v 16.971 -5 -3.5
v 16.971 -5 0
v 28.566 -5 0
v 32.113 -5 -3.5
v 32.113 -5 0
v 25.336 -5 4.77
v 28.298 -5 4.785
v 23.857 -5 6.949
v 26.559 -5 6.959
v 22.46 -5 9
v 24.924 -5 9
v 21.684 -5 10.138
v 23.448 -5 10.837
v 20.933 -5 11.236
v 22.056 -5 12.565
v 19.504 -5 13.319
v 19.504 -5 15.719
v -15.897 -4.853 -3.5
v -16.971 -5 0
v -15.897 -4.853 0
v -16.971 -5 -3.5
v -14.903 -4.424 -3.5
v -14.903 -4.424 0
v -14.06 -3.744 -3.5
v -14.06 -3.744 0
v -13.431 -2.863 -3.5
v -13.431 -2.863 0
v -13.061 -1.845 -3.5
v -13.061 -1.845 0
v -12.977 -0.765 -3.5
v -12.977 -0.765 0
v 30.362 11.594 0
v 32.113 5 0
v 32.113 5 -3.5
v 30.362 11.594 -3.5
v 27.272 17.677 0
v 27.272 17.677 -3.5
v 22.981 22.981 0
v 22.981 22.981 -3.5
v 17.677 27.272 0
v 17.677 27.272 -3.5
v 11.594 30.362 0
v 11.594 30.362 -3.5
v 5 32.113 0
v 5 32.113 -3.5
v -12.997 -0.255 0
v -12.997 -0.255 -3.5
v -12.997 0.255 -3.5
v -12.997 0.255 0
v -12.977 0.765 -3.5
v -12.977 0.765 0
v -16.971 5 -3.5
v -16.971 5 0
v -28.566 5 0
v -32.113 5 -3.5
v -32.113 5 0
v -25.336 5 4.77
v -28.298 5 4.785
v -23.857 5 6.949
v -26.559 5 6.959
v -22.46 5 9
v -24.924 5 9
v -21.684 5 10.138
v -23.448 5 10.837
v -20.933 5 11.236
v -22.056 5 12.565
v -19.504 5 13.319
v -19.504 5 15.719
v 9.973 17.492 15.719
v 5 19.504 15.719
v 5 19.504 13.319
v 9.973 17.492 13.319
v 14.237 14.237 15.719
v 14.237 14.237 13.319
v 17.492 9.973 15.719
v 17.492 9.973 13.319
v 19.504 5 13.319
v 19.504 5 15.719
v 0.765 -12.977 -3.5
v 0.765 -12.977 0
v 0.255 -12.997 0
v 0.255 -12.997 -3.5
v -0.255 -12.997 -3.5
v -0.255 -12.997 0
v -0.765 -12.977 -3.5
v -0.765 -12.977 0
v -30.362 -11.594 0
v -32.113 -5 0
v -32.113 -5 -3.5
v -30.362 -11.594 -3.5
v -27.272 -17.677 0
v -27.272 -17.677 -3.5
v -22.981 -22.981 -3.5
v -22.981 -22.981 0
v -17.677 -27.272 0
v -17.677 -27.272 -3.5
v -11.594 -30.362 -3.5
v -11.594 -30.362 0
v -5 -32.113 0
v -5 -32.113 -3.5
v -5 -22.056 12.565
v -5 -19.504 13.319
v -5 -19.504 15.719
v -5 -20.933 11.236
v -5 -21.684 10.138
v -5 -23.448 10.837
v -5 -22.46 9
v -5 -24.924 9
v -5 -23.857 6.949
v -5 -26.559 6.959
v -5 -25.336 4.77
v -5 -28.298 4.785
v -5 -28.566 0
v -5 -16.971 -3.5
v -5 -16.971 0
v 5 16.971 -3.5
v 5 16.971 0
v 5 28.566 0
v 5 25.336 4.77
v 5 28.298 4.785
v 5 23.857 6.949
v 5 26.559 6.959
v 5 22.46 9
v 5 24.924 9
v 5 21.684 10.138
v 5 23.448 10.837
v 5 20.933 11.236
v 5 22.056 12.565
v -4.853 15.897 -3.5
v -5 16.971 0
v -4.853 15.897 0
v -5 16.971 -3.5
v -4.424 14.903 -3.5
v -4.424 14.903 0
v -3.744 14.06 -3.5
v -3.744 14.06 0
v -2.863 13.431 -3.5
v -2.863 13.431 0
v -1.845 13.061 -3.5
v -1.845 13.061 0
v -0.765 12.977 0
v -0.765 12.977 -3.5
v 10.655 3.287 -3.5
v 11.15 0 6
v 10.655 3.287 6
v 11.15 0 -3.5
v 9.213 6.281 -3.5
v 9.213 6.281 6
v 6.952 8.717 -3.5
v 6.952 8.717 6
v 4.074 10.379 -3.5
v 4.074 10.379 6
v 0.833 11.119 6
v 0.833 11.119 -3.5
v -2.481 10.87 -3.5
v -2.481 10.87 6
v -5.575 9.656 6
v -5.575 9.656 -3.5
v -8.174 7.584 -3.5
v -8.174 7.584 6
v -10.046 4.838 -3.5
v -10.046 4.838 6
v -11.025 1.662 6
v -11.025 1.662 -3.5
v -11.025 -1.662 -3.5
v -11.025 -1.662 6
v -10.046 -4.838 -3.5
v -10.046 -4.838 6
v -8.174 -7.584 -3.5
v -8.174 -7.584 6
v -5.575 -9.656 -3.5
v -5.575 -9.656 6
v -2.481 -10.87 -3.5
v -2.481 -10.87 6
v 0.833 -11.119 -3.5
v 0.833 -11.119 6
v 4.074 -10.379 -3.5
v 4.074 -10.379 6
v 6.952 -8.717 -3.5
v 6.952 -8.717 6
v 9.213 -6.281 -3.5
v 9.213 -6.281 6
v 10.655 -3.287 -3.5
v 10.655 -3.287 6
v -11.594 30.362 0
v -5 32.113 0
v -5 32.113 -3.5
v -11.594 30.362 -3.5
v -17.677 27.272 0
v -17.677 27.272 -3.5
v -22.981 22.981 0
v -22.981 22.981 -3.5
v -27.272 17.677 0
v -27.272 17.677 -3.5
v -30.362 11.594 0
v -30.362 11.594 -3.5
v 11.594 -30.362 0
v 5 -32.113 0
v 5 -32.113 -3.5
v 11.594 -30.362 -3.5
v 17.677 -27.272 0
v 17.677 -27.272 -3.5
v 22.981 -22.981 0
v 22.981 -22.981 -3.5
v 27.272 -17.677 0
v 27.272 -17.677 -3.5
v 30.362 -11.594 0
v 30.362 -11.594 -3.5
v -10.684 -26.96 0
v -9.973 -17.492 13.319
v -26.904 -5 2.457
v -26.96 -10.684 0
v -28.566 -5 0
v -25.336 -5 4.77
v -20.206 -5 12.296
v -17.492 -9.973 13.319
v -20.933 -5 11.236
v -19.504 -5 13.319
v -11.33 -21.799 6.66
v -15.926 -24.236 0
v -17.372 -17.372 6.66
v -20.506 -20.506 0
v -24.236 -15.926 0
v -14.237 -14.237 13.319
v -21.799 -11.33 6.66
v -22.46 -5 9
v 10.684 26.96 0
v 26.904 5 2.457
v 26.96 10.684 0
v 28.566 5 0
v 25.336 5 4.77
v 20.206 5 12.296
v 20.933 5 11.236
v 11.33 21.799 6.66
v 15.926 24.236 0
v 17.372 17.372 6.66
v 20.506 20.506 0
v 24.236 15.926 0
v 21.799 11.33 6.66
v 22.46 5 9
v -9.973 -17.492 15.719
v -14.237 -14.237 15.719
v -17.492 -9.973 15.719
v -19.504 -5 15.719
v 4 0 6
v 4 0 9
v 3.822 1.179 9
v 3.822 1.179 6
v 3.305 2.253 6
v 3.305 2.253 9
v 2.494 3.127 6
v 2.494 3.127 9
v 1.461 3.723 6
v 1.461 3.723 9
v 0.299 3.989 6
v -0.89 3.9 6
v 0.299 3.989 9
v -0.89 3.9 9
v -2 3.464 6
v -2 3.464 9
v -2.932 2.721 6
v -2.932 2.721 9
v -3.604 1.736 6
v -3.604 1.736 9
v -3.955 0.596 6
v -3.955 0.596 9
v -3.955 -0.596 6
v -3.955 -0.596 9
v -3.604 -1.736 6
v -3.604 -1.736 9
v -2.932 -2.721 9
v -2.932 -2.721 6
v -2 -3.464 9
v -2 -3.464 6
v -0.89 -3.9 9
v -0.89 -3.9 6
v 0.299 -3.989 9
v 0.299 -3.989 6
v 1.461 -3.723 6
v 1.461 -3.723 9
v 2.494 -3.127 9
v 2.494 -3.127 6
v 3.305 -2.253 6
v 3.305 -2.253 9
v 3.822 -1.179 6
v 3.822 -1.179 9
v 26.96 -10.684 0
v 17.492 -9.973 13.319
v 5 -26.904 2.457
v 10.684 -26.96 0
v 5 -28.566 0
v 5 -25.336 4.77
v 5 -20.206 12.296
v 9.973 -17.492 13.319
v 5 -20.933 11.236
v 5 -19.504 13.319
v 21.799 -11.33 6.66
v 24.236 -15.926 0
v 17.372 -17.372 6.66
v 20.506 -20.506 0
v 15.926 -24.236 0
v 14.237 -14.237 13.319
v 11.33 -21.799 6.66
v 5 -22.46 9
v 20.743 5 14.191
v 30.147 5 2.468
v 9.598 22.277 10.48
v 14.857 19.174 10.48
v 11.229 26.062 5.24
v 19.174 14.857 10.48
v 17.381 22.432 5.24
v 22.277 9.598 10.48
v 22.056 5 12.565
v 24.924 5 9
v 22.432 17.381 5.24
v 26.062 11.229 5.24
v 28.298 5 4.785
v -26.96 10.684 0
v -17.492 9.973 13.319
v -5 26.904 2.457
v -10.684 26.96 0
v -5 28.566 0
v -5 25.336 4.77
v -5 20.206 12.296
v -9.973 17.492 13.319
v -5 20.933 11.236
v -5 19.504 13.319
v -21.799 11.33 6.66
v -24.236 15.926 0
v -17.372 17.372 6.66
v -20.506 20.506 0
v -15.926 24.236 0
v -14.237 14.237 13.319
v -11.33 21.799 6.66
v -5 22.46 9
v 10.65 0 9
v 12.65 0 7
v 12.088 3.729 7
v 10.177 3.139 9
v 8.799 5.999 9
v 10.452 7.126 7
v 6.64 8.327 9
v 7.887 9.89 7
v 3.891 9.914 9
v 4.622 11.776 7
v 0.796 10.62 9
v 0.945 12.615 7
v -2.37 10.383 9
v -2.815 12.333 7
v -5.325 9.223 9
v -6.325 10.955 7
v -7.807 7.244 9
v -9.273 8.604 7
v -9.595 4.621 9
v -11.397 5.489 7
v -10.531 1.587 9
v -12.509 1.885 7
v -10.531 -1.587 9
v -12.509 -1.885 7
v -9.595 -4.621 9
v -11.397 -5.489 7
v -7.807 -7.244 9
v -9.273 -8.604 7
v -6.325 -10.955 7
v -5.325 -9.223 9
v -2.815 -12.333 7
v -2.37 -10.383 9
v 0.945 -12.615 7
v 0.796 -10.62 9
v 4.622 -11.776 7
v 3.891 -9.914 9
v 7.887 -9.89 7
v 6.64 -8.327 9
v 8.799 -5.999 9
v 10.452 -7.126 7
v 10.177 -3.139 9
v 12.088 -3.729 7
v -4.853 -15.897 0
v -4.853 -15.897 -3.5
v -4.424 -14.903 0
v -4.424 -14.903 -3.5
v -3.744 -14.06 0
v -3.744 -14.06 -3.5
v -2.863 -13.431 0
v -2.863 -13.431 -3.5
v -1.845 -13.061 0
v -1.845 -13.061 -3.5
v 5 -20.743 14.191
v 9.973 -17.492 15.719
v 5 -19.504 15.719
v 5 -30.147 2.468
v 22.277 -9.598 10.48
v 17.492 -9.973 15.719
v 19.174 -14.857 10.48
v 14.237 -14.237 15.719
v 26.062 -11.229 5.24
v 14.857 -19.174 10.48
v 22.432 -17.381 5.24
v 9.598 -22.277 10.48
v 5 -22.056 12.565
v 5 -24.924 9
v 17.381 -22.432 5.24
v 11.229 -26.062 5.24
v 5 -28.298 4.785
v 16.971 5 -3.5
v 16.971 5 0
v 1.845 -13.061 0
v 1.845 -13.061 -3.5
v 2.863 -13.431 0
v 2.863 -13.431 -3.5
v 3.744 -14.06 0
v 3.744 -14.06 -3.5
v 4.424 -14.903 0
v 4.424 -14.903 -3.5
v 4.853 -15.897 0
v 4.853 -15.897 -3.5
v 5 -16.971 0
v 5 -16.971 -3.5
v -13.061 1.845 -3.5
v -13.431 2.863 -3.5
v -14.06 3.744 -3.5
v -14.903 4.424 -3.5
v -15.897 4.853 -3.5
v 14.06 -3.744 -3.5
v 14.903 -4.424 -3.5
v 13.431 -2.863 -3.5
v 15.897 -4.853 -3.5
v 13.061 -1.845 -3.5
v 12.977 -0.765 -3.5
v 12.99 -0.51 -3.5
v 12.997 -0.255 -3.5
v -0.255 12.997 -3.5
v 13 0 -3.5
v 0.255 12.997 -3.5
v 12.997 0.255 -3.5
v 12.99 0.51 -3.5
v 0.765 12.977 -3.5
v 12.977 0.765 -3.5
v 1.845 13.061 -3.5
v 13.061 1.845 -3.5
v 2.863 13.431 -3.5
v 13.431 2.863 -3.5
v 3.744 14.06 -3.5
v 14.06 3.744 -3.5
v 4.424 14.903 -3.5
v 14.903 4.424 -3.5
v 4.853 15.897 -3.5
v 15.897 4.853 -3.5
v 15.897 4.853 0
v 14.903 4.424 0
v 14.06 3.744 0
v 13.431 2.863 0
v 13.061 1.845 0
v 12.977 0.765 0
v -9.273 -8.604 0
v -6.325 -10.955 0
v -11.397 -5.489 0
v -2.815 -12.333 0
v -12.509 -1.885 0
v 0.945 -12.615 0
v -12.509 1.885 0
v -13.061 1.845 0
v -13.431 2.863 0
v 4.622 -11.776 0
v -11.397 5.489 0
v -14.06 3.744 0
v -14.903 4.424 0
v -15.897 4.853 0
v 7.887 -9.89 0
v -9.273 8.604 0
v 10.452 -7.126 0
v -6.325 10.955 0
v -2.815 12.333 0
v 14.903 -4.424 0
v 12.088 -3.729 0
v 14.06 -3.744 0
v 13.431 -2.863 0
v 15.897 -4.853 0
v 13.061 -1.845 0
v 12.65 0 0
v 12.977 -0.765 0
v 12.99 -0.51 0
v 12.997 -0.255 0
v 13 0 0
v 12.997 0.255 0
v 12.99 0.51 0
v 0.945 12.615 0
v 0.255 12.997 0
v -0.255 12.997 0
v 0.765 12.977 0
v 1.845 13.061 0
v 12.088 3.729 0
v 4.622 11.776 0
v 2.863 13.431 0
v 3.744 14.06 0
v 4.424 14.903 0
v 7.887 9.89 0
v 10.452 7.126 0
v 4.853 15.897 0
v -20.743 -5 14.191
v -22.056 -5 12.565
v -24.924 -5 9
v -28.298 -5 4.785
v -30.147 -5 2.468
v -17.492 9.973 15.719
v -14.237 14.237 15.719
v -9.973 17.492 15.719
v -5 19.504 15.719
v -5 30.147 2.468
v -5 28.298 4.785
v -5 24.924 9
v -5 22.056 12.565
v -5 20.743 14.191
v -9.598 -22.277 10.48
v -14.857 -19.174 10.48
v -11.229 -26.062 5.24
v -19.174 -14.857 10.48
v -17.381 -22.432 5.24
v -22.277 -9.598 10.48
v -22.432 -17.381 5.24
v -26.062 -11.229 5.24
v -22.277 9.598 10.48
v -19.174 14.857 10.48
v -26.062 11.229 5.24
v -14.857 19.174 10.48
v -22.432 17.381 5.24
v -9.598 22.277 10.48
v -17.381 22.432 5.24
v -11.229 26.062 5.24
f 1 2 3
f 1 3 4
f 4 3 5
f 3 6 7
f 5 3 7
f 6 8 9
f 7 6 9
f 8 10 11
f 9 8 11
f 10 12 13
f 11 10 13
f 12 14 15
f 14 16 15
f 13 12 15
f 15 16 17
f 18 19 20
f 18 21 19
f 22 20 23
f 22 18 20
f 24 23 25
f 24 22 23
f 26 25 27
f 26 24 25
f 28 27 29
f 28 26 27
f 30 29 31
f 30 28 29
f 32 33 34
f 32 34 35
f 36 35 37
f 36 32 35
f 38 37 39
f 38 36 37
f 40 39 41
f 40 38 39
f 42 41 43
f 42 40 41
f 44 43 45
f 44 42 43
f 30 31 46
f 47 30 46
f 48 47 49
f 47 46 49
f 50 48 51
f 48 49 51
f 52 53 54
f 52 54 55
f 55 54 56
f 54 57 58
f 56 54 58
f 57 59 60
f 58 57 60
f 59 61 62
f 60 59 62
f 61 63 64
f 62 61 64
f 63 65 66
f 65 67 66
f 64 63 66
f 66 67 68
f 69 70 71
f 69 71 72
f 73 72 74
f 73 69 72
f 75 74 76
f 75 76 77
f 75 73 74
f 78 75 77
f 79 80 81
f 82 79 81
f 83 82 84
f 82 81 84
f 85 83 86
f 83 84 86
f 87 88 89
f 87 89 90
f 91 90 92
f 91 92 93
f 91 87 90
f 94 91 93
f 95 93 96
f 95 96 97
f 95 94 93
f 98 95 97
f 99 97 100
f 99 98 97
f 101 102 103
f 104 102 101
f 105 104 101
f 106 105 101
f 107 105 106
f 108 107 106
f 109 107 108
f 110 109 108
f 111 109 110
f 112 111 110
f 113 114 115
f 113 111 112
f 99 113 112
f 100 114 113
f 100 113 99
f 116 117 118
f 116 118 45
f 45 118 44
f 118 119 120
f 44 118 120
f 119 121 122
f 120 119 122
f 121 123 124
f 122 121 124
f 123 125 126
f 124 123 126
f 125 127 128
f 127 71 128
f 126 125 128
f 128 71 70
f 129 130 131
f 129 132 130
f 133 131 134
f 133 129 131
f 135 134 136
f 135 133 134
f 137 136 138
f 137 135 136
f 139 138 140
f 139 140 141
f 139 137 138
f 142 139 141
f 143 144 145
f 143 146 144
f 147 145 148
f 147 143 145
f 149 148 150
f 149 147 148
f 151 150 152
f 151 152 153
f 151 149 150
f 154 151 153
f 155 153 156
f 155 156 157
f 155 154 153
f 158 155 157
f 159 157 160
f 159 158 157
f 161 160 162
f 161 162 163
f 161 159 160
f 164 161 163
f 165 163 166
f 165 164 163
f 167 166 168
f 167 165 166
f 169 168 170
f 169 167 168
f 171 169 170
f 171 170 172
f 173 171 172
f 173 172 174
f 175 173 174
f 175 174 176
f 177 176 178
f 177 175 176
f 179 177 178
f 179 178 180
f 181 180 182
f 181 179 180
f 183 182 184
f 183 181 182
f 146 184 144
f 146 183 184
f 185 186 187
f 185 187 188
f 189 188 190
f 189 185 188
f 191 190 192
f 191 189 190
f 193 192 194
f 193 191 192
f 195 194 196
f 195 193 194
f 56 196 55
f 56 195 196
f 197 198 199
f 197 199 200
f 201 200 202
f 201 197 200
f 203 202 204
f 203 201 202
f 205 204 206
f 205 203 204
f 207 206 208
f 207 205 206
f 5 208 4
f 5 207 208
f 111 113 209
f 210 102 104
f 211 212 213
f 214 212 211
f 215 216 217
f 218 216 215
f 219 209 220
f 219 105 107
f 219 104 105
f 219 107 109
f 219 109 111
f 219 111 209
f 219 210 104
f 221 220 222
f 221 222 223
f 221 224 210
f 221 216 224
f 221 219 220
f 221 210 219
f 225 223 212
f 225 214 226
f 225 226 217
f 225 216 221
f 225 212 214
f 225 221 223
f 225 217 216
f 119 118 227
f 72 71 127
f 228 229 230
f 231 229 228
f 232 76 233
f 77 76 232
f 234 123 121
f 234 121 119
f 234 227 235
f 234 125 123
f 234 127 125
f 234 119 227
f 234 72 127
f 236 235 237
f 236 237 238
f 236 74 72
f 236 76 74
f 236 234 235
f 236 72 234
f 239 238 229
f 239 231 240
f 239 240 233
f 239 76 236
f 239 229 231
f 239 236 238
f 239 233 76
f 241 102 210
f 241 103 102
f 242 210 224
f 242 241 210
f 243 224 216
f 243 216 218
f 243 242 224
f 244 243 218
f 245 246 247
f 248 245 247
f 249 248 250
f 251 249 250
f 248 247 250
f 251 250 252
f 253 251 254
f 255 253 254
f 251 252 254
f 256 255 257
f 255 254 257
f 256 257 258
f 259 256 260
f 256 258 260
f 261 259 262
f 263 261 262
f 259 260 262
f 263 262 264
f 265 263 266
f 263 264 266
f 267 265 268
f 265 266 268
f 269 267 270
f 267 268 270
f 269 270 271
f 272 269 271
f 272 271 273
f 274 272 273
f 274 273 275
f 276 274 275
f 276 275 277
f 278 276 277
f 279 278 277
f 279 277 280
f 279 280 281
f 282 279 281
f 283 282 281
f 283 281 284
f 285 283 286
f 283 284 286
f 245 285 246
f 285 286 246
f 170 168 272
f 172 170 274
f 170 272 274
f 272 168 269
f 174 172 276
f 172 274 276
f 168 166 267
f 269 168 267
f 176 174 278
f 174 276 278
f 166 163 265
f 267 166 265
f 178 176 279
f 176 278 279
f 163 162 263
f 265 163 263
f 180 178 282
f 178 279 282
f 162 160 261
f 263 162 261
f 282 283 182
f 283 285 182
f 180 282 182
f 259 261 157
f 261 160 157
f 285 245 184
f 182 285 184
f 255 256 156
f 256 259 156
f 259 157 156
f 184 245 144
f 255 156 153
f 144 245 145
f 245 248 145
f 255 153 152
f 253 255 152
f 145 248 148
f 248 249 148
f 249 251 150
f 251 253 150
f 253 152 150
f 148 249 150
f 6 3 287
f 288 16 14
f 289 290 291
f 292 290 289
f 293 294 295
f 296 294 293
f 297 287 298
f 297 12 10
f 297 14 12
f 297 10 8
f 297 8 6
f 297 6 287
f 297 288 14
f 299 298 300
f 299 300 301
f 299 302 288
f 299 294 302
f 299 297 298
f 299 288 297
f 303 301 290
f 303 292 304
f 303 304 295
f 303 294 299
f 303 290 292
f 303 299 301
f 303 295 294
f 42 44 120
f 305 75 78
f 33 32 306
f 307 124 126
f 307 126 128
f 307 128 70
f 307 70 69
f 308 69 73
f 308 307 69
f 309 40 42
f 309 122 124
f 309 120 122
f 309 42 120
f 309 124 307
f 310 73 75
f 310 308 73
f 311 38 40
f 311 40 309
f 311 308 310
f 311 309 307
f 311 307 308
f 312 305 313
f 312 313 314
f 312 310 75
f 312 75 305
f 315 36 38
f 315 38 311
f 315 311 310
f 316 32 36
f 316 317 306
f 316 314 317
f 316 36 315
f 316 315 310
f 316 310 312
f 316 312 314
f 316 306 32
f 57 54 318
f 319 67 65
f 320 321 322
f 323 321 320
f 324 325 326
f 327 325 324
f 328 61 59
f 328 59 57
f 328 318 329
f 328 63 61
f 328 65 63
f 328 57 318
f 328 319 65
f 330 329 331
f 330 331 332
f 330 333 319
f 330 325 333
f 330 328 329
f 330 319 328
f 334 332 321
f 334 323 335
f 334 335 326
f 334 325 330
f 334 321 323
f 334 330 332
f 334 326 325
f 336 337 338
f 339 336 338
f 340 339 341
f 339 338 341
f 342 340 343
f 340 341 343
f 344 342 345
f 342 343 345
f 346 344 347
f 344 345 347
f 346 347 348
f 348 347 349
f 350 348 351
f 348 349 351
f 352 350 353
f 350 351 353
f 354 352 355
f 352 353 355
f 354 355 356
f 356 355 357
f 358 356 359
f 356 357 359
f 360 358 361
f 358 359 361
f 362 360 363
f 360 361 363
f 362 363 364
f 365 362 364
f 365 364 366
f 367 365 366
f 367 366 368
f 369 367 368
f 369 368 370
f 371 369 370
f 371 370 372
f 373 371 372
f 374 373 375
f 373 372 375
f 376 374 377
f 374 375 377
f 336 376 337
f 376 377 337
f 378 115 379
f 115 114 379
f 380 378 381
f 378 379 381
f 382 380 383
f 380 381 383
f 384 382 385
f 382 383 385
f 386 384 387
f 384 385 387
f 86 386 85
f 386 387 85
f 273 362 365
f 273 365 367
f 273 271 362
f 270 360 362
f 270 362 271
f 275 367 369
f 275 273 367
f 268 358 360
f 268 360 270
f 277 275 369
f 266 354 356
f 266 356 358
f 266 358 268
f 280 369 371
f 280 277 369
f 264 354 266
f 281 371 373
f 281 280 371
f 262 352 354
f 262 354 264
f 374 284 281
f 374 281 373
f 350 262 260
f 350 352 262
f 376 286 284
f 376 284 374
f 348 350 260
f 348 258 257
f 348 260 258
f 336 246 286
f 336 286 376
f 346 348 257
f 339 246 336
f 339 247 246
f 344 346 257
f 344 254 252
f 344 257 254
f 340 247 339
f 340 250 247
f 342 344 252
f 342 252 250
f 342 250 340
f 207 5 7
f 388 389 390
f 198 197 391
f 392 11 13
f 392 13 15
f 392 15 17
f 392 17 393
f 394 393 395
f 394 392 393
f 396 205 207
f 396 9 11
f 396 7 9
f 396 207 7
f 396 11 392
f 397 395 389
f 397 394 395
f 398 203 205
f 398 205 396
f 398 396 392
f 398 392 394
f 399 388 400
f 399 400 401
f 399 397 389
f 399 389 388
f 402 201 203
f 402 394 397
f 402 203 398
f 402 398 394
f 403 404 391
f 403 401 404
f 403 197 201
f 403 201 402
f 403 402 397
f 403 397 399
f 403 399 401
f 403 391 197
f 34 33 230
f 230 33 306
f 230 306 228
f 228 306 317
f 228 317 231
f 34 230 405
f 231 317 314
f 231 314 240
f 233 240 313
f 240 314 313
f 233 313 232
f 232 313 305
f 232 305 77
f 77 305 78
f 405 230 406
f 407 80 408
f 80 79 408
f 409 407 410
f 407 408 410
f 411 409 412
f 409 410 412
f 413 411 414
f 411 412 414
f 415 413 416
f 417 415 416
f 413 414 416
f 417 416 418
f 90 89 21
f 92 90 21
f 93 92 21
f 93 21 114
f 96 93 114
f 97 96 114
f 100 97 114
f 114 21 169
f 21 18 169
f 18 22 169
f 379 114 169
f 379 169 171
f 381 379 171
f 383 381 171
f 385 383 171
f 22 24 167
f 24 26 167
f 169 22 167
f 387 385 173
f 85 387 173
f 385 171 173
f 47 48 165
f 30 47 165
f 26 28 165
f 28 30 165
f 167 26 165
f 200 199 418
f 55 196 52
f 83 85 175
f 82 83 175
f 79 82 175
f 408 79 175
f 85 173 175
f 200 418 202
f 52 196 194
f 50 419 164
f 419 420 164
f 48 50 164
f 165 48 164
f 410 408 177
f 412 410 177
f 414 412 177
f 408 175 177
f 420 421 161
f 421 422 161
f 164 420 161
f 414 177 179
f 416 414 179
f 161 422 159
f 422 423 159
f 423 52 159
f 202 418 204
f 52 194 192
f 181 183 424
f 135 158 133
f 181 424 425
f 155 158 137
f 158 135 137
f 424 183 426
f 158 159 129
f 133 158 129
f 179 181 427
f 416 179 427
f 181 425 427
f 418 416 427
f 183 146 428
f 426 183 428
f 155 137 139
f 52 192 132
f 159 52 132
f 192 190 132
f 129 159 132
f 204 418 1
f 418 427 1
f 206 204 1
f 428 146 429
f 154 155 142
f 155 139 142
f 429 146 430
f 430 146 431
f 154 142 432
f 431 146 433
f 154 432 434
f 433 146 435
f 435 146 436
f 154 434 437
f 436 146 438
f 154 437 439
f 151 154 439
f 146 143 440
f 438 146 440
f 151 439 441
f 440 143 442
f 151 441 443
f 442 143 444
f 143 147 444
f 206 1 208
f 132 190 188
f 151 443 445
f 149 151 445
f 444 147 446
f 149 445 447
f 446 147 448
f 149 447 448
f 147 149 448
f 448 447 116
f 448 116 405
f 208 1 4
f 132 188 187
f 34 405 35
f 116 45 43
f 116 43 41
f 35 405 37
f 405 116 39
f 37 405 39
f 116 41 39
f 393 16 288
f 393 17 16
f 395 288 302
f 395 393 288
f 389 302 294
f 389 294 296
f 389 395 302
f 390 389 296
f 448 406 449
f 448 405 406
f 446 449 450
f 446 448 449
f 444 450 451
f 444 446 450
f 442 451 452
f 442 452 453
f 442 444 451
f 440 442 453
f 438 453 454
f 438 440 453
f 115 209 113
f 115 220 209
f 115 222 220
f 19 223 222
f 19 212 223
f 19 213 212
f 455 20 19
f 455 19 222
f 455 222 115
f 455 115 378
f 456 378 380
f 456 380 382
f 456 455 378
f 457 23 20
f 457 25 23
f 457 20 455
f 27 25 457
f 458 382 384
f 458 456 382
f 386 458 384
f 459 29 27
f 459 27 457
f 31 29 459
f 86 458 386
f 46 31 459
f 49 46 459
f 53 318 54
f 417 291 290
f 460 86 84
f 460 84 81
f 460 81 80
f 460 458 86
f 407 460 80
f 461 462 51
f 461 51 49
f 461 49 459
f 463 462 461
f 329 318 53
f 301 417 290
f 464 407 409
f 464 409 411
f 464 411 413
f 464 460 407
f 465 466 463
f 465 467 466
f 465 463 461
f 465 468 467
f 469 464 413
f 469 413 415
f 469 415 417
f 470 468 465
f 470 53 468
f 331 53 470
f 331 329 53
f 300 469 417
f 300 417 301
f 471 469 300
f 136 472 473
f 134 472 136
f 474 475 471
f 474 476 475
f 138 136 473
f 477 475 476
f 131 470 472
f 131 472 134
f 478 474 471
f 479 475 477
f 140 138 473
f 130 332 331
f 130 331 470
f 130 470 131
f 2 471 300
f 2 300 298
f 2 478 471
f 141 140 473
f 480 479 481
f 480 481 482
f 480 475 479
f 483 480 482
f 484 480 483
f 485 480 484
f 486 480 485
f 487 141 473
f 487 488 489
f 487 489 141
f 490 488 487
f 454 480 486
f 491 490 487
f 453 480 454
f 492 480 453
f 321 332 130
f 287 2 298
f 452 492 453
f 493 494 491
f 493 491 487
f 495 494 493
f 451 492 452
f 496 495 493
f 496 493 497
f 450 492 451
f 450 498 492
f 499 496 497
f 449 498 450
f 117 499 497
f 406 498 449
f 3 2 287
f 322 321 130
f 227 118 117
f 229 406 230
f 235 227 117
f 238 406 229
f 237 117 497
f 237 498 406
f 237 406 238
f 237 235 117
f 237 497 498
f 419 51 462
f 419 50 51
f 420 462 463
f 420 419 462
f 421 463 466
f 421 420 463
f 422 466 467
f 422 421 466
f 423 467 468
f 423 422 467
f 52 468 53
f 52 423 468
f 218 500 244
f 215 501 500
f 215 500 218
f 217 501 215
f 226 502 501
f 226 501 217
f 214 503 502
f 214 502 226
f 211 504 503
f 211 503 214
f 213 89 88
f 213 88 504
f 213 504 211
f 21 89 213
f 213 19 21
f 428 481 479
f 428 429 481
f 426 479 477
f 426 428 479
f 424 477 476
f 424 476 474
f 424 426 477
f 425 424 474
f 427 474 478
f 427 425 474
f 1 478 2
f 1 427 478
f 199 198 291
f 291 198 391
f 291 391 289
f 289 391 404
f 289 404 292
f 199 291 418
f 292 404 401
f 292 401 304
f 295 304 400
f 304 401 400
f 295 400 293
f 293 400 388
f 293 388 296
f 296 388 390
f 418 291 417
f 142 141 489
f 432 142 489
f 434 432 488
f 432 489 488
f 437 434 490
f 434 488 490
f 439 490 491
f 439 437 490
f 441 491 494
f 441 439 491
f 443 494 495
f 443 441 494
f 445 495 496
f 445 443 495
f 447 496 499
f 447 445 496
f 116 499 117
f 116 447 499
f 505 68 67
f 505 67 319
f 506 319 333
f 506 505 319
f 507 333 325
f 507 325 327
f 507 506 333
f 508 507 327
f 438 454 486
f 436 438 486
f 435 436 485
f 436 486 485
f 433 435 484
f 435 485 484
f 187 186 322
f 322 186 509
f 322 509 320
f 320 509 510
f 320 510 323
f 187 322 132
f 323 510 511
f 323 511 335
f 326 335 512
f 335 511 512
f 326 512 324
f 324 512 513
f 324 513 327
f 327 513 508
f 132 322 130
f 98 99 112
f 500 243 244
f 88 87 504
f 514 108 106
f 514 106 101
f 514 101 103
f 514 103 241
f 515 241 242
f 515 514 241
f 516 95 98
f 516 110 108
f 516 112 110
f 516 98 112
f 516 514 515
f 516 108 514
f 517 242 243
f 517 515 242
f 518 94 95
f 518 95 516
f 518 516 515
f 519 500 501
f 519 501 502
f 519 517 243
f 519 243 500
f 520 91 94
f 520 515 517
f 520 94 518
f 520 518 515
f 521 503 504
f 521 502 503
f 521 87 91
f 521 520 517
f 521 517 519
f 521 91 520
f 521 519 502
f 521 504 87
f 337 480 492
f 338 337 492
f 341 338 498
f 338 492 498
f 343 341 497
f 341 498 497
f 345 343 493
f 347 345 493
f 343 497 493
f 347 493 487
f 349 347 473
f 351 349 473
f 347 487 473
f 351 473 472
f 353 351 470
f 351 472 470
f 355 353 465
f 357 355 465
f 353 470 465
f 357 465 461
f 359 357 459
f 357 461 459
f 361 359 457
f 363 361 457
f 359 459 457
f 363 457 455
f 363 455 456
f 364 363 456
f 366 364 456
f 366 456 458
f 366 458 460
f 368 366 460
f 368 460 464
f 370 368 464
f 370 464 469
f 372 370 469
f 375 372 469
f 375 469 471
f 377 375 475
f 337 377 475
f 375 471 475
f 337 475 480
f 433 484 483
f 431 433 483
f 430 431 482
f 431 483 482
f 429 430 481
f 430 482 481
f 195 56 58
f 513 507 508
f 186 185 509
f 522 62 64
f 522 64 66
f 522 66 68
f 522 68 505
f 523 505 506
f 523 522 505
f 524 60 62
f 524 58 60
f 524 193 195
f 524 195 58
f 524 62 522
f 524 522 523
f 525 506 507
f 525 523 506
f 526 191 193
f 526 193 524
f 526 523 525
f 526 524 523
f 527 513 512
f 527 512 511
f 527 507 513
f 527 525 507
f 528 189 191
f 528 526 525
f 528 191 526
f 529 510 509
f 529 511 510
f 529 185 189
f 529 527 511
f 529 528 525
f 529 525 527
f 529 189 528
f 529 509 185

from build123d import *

# Parameters (mm, degrees)
F0_R      = 32.5
F0_R_2    = 12.65
F0_R_3    = 11.15
F1_DEPTH  = 3.5
F2_DEPTH  = 9
F3_R      = 11.15
F3_R_2    = 4
F4_DEPTH  = 3
F5_SIZE   = 2
F10_DEPTH = 25
F11_DEPTH = 15.2
F12_R     = 4


with BuildPart() as f1:
    # F0 (on Top) → F1 (new body)
    with BuildSketch(Plane.XY):
        Circle(F0_R)
        Circle(F0_R_2, mode=Mode.SUBTRACT)
        Circle(F0_R_2)
        Circle(F0_R_3, mode=Mode.SUBTRACT)
    extrude(amount=-F1_DEPTH)

    # F0 (on Top) → F2 (join)
    with BuildSketch(Plane.XY):
        Circle(F0_R_2)
        Circle(F0_R_3, mode=Mode.SUBTRACT)
    extrude(amount=F2_DEPTH)

    # F3 (on face) → F4 (join)
    with BuildSketch(Plane.XY.offset(9)):
        Circle(F3_R)
        Circle(F3_R_2, mode=Mode.SUBTRACT)
    extrude(amount=-F4_DEPTH)

    # F5
    f5_edges = [f1.edges().sort_by_distance(p)[0] for p in [
        (-12.65, 0, 9),
    ]]
    chamfer(f5_edges, length=F5_SIZE)

    # F6 (on Front) → F7 (revolve)
    with BuildSketch(Plane.XZ):
        Polygon((-20.1347596889, 15.719441213), (-32.5, 0), (-29, 0), (-20.1347596889, 13.319441213), align=None)
    revolve(axis=Axis((0, 0, 0), (0, 0, -1)))

    # F9 (on offset) → F10 (cut)
    with BuildSketch(Plane.XY.offset(9)):
        with BuildLine():
            Line((5, 35), (-5, 35))
            Line((-5, 35), (-5, 12))
            ThreePointArc((-5, 12), (0, 13), (5, 12))
            Line((5, 12), (5, 35))
        make_face()
        with BuildLine():
            Line((35, 5), (12, 5))
            ThreePointArc((12, 5), (12.747548784, 2.5495097568), (13, 0))
            ThreePointArc((13, 0), (12.747548784, -2.5495097568), (12, -5))
            Line((12, -5), (35, -5))
            Line((35, -5), (35, 5))
        make_face()
        with BuildLine():
            ThreePointArc((5, -12), (0, -13), (-5, -12))
            Line((-5, -12), (-5, -35))
            Line((-5, -35), (5, -35))
            Line((5, -35), (5, -12))
        make_face()
        with BuildLine():
            ThreePointArc((-12, -5), (-13, 0), (-12, 5))
            Line((-12, 5), (-35, 5))
            Line((-35, 5), (-35, -5))
            Line((-35, -5), (-12, -5))
        make_face()
    extrude(amount=F10_DEPTH, mode=Mode.SUBTRACT)

    # F9 (on offset) → F11 (cut)
    with BuildSketch(Plane.XY.offset(9)):
        with BuildLine():
            ThreePointArc((5, -12), (0, -13), (-5, -12))
            Line((-5, -12), (-5, -35))
            Line((-5, -35), (5, -35))
            Line((5, -35), (5, -12))
        make_face()
        with BuildLine():
            Line((5, 35), (-5, 35))
            Line((-5, 35), (-5, 12))
            ThreePointArc((-5, 12), (0, 13), (5, 12))
            Line((5, 12), (5, 35))
        make_face()
        with BuildLine():
            ThreePointArc((-12, -5), (-13, 0), (-12, 5))
            Line((-12, 5), (-35, 5))
            Line((-35, 5), (-35, -5))
            Line((-35, -5), (-12, -5))
        make_face()
        with BuildLine():
            Line((35, 5), (12, 5))
            ThreePointArc((12, 5), (12.747548784, 2.5495097568), (13, 0))
            ThreePointArc((13, 0), (12.747548784, -2.5495097568), (12, -5))
            Line((12, -5), (35, -5))
            Line((35, -5), (35, 5))
        make_face()
    extrude(amount=-F11_DEPTH, mode=Mode.SUBTRACT)

    # F12
    f12_edges = [f1.edges().sort_by_distance(p)[0] for p in [
        (-12, 5, -1.75),
        (-12, -5, -1.75),
        (-5, 12, -1.75),
        (5, 12, -1.75),
        (-5, -12, -1.75),
        (5, -12, -1.75),
        (12, -5, -1.75),
        (12, 5, -1.75),
    ]]
    fillet(f12_edges, radius=F12_R)


solid = f1.part
